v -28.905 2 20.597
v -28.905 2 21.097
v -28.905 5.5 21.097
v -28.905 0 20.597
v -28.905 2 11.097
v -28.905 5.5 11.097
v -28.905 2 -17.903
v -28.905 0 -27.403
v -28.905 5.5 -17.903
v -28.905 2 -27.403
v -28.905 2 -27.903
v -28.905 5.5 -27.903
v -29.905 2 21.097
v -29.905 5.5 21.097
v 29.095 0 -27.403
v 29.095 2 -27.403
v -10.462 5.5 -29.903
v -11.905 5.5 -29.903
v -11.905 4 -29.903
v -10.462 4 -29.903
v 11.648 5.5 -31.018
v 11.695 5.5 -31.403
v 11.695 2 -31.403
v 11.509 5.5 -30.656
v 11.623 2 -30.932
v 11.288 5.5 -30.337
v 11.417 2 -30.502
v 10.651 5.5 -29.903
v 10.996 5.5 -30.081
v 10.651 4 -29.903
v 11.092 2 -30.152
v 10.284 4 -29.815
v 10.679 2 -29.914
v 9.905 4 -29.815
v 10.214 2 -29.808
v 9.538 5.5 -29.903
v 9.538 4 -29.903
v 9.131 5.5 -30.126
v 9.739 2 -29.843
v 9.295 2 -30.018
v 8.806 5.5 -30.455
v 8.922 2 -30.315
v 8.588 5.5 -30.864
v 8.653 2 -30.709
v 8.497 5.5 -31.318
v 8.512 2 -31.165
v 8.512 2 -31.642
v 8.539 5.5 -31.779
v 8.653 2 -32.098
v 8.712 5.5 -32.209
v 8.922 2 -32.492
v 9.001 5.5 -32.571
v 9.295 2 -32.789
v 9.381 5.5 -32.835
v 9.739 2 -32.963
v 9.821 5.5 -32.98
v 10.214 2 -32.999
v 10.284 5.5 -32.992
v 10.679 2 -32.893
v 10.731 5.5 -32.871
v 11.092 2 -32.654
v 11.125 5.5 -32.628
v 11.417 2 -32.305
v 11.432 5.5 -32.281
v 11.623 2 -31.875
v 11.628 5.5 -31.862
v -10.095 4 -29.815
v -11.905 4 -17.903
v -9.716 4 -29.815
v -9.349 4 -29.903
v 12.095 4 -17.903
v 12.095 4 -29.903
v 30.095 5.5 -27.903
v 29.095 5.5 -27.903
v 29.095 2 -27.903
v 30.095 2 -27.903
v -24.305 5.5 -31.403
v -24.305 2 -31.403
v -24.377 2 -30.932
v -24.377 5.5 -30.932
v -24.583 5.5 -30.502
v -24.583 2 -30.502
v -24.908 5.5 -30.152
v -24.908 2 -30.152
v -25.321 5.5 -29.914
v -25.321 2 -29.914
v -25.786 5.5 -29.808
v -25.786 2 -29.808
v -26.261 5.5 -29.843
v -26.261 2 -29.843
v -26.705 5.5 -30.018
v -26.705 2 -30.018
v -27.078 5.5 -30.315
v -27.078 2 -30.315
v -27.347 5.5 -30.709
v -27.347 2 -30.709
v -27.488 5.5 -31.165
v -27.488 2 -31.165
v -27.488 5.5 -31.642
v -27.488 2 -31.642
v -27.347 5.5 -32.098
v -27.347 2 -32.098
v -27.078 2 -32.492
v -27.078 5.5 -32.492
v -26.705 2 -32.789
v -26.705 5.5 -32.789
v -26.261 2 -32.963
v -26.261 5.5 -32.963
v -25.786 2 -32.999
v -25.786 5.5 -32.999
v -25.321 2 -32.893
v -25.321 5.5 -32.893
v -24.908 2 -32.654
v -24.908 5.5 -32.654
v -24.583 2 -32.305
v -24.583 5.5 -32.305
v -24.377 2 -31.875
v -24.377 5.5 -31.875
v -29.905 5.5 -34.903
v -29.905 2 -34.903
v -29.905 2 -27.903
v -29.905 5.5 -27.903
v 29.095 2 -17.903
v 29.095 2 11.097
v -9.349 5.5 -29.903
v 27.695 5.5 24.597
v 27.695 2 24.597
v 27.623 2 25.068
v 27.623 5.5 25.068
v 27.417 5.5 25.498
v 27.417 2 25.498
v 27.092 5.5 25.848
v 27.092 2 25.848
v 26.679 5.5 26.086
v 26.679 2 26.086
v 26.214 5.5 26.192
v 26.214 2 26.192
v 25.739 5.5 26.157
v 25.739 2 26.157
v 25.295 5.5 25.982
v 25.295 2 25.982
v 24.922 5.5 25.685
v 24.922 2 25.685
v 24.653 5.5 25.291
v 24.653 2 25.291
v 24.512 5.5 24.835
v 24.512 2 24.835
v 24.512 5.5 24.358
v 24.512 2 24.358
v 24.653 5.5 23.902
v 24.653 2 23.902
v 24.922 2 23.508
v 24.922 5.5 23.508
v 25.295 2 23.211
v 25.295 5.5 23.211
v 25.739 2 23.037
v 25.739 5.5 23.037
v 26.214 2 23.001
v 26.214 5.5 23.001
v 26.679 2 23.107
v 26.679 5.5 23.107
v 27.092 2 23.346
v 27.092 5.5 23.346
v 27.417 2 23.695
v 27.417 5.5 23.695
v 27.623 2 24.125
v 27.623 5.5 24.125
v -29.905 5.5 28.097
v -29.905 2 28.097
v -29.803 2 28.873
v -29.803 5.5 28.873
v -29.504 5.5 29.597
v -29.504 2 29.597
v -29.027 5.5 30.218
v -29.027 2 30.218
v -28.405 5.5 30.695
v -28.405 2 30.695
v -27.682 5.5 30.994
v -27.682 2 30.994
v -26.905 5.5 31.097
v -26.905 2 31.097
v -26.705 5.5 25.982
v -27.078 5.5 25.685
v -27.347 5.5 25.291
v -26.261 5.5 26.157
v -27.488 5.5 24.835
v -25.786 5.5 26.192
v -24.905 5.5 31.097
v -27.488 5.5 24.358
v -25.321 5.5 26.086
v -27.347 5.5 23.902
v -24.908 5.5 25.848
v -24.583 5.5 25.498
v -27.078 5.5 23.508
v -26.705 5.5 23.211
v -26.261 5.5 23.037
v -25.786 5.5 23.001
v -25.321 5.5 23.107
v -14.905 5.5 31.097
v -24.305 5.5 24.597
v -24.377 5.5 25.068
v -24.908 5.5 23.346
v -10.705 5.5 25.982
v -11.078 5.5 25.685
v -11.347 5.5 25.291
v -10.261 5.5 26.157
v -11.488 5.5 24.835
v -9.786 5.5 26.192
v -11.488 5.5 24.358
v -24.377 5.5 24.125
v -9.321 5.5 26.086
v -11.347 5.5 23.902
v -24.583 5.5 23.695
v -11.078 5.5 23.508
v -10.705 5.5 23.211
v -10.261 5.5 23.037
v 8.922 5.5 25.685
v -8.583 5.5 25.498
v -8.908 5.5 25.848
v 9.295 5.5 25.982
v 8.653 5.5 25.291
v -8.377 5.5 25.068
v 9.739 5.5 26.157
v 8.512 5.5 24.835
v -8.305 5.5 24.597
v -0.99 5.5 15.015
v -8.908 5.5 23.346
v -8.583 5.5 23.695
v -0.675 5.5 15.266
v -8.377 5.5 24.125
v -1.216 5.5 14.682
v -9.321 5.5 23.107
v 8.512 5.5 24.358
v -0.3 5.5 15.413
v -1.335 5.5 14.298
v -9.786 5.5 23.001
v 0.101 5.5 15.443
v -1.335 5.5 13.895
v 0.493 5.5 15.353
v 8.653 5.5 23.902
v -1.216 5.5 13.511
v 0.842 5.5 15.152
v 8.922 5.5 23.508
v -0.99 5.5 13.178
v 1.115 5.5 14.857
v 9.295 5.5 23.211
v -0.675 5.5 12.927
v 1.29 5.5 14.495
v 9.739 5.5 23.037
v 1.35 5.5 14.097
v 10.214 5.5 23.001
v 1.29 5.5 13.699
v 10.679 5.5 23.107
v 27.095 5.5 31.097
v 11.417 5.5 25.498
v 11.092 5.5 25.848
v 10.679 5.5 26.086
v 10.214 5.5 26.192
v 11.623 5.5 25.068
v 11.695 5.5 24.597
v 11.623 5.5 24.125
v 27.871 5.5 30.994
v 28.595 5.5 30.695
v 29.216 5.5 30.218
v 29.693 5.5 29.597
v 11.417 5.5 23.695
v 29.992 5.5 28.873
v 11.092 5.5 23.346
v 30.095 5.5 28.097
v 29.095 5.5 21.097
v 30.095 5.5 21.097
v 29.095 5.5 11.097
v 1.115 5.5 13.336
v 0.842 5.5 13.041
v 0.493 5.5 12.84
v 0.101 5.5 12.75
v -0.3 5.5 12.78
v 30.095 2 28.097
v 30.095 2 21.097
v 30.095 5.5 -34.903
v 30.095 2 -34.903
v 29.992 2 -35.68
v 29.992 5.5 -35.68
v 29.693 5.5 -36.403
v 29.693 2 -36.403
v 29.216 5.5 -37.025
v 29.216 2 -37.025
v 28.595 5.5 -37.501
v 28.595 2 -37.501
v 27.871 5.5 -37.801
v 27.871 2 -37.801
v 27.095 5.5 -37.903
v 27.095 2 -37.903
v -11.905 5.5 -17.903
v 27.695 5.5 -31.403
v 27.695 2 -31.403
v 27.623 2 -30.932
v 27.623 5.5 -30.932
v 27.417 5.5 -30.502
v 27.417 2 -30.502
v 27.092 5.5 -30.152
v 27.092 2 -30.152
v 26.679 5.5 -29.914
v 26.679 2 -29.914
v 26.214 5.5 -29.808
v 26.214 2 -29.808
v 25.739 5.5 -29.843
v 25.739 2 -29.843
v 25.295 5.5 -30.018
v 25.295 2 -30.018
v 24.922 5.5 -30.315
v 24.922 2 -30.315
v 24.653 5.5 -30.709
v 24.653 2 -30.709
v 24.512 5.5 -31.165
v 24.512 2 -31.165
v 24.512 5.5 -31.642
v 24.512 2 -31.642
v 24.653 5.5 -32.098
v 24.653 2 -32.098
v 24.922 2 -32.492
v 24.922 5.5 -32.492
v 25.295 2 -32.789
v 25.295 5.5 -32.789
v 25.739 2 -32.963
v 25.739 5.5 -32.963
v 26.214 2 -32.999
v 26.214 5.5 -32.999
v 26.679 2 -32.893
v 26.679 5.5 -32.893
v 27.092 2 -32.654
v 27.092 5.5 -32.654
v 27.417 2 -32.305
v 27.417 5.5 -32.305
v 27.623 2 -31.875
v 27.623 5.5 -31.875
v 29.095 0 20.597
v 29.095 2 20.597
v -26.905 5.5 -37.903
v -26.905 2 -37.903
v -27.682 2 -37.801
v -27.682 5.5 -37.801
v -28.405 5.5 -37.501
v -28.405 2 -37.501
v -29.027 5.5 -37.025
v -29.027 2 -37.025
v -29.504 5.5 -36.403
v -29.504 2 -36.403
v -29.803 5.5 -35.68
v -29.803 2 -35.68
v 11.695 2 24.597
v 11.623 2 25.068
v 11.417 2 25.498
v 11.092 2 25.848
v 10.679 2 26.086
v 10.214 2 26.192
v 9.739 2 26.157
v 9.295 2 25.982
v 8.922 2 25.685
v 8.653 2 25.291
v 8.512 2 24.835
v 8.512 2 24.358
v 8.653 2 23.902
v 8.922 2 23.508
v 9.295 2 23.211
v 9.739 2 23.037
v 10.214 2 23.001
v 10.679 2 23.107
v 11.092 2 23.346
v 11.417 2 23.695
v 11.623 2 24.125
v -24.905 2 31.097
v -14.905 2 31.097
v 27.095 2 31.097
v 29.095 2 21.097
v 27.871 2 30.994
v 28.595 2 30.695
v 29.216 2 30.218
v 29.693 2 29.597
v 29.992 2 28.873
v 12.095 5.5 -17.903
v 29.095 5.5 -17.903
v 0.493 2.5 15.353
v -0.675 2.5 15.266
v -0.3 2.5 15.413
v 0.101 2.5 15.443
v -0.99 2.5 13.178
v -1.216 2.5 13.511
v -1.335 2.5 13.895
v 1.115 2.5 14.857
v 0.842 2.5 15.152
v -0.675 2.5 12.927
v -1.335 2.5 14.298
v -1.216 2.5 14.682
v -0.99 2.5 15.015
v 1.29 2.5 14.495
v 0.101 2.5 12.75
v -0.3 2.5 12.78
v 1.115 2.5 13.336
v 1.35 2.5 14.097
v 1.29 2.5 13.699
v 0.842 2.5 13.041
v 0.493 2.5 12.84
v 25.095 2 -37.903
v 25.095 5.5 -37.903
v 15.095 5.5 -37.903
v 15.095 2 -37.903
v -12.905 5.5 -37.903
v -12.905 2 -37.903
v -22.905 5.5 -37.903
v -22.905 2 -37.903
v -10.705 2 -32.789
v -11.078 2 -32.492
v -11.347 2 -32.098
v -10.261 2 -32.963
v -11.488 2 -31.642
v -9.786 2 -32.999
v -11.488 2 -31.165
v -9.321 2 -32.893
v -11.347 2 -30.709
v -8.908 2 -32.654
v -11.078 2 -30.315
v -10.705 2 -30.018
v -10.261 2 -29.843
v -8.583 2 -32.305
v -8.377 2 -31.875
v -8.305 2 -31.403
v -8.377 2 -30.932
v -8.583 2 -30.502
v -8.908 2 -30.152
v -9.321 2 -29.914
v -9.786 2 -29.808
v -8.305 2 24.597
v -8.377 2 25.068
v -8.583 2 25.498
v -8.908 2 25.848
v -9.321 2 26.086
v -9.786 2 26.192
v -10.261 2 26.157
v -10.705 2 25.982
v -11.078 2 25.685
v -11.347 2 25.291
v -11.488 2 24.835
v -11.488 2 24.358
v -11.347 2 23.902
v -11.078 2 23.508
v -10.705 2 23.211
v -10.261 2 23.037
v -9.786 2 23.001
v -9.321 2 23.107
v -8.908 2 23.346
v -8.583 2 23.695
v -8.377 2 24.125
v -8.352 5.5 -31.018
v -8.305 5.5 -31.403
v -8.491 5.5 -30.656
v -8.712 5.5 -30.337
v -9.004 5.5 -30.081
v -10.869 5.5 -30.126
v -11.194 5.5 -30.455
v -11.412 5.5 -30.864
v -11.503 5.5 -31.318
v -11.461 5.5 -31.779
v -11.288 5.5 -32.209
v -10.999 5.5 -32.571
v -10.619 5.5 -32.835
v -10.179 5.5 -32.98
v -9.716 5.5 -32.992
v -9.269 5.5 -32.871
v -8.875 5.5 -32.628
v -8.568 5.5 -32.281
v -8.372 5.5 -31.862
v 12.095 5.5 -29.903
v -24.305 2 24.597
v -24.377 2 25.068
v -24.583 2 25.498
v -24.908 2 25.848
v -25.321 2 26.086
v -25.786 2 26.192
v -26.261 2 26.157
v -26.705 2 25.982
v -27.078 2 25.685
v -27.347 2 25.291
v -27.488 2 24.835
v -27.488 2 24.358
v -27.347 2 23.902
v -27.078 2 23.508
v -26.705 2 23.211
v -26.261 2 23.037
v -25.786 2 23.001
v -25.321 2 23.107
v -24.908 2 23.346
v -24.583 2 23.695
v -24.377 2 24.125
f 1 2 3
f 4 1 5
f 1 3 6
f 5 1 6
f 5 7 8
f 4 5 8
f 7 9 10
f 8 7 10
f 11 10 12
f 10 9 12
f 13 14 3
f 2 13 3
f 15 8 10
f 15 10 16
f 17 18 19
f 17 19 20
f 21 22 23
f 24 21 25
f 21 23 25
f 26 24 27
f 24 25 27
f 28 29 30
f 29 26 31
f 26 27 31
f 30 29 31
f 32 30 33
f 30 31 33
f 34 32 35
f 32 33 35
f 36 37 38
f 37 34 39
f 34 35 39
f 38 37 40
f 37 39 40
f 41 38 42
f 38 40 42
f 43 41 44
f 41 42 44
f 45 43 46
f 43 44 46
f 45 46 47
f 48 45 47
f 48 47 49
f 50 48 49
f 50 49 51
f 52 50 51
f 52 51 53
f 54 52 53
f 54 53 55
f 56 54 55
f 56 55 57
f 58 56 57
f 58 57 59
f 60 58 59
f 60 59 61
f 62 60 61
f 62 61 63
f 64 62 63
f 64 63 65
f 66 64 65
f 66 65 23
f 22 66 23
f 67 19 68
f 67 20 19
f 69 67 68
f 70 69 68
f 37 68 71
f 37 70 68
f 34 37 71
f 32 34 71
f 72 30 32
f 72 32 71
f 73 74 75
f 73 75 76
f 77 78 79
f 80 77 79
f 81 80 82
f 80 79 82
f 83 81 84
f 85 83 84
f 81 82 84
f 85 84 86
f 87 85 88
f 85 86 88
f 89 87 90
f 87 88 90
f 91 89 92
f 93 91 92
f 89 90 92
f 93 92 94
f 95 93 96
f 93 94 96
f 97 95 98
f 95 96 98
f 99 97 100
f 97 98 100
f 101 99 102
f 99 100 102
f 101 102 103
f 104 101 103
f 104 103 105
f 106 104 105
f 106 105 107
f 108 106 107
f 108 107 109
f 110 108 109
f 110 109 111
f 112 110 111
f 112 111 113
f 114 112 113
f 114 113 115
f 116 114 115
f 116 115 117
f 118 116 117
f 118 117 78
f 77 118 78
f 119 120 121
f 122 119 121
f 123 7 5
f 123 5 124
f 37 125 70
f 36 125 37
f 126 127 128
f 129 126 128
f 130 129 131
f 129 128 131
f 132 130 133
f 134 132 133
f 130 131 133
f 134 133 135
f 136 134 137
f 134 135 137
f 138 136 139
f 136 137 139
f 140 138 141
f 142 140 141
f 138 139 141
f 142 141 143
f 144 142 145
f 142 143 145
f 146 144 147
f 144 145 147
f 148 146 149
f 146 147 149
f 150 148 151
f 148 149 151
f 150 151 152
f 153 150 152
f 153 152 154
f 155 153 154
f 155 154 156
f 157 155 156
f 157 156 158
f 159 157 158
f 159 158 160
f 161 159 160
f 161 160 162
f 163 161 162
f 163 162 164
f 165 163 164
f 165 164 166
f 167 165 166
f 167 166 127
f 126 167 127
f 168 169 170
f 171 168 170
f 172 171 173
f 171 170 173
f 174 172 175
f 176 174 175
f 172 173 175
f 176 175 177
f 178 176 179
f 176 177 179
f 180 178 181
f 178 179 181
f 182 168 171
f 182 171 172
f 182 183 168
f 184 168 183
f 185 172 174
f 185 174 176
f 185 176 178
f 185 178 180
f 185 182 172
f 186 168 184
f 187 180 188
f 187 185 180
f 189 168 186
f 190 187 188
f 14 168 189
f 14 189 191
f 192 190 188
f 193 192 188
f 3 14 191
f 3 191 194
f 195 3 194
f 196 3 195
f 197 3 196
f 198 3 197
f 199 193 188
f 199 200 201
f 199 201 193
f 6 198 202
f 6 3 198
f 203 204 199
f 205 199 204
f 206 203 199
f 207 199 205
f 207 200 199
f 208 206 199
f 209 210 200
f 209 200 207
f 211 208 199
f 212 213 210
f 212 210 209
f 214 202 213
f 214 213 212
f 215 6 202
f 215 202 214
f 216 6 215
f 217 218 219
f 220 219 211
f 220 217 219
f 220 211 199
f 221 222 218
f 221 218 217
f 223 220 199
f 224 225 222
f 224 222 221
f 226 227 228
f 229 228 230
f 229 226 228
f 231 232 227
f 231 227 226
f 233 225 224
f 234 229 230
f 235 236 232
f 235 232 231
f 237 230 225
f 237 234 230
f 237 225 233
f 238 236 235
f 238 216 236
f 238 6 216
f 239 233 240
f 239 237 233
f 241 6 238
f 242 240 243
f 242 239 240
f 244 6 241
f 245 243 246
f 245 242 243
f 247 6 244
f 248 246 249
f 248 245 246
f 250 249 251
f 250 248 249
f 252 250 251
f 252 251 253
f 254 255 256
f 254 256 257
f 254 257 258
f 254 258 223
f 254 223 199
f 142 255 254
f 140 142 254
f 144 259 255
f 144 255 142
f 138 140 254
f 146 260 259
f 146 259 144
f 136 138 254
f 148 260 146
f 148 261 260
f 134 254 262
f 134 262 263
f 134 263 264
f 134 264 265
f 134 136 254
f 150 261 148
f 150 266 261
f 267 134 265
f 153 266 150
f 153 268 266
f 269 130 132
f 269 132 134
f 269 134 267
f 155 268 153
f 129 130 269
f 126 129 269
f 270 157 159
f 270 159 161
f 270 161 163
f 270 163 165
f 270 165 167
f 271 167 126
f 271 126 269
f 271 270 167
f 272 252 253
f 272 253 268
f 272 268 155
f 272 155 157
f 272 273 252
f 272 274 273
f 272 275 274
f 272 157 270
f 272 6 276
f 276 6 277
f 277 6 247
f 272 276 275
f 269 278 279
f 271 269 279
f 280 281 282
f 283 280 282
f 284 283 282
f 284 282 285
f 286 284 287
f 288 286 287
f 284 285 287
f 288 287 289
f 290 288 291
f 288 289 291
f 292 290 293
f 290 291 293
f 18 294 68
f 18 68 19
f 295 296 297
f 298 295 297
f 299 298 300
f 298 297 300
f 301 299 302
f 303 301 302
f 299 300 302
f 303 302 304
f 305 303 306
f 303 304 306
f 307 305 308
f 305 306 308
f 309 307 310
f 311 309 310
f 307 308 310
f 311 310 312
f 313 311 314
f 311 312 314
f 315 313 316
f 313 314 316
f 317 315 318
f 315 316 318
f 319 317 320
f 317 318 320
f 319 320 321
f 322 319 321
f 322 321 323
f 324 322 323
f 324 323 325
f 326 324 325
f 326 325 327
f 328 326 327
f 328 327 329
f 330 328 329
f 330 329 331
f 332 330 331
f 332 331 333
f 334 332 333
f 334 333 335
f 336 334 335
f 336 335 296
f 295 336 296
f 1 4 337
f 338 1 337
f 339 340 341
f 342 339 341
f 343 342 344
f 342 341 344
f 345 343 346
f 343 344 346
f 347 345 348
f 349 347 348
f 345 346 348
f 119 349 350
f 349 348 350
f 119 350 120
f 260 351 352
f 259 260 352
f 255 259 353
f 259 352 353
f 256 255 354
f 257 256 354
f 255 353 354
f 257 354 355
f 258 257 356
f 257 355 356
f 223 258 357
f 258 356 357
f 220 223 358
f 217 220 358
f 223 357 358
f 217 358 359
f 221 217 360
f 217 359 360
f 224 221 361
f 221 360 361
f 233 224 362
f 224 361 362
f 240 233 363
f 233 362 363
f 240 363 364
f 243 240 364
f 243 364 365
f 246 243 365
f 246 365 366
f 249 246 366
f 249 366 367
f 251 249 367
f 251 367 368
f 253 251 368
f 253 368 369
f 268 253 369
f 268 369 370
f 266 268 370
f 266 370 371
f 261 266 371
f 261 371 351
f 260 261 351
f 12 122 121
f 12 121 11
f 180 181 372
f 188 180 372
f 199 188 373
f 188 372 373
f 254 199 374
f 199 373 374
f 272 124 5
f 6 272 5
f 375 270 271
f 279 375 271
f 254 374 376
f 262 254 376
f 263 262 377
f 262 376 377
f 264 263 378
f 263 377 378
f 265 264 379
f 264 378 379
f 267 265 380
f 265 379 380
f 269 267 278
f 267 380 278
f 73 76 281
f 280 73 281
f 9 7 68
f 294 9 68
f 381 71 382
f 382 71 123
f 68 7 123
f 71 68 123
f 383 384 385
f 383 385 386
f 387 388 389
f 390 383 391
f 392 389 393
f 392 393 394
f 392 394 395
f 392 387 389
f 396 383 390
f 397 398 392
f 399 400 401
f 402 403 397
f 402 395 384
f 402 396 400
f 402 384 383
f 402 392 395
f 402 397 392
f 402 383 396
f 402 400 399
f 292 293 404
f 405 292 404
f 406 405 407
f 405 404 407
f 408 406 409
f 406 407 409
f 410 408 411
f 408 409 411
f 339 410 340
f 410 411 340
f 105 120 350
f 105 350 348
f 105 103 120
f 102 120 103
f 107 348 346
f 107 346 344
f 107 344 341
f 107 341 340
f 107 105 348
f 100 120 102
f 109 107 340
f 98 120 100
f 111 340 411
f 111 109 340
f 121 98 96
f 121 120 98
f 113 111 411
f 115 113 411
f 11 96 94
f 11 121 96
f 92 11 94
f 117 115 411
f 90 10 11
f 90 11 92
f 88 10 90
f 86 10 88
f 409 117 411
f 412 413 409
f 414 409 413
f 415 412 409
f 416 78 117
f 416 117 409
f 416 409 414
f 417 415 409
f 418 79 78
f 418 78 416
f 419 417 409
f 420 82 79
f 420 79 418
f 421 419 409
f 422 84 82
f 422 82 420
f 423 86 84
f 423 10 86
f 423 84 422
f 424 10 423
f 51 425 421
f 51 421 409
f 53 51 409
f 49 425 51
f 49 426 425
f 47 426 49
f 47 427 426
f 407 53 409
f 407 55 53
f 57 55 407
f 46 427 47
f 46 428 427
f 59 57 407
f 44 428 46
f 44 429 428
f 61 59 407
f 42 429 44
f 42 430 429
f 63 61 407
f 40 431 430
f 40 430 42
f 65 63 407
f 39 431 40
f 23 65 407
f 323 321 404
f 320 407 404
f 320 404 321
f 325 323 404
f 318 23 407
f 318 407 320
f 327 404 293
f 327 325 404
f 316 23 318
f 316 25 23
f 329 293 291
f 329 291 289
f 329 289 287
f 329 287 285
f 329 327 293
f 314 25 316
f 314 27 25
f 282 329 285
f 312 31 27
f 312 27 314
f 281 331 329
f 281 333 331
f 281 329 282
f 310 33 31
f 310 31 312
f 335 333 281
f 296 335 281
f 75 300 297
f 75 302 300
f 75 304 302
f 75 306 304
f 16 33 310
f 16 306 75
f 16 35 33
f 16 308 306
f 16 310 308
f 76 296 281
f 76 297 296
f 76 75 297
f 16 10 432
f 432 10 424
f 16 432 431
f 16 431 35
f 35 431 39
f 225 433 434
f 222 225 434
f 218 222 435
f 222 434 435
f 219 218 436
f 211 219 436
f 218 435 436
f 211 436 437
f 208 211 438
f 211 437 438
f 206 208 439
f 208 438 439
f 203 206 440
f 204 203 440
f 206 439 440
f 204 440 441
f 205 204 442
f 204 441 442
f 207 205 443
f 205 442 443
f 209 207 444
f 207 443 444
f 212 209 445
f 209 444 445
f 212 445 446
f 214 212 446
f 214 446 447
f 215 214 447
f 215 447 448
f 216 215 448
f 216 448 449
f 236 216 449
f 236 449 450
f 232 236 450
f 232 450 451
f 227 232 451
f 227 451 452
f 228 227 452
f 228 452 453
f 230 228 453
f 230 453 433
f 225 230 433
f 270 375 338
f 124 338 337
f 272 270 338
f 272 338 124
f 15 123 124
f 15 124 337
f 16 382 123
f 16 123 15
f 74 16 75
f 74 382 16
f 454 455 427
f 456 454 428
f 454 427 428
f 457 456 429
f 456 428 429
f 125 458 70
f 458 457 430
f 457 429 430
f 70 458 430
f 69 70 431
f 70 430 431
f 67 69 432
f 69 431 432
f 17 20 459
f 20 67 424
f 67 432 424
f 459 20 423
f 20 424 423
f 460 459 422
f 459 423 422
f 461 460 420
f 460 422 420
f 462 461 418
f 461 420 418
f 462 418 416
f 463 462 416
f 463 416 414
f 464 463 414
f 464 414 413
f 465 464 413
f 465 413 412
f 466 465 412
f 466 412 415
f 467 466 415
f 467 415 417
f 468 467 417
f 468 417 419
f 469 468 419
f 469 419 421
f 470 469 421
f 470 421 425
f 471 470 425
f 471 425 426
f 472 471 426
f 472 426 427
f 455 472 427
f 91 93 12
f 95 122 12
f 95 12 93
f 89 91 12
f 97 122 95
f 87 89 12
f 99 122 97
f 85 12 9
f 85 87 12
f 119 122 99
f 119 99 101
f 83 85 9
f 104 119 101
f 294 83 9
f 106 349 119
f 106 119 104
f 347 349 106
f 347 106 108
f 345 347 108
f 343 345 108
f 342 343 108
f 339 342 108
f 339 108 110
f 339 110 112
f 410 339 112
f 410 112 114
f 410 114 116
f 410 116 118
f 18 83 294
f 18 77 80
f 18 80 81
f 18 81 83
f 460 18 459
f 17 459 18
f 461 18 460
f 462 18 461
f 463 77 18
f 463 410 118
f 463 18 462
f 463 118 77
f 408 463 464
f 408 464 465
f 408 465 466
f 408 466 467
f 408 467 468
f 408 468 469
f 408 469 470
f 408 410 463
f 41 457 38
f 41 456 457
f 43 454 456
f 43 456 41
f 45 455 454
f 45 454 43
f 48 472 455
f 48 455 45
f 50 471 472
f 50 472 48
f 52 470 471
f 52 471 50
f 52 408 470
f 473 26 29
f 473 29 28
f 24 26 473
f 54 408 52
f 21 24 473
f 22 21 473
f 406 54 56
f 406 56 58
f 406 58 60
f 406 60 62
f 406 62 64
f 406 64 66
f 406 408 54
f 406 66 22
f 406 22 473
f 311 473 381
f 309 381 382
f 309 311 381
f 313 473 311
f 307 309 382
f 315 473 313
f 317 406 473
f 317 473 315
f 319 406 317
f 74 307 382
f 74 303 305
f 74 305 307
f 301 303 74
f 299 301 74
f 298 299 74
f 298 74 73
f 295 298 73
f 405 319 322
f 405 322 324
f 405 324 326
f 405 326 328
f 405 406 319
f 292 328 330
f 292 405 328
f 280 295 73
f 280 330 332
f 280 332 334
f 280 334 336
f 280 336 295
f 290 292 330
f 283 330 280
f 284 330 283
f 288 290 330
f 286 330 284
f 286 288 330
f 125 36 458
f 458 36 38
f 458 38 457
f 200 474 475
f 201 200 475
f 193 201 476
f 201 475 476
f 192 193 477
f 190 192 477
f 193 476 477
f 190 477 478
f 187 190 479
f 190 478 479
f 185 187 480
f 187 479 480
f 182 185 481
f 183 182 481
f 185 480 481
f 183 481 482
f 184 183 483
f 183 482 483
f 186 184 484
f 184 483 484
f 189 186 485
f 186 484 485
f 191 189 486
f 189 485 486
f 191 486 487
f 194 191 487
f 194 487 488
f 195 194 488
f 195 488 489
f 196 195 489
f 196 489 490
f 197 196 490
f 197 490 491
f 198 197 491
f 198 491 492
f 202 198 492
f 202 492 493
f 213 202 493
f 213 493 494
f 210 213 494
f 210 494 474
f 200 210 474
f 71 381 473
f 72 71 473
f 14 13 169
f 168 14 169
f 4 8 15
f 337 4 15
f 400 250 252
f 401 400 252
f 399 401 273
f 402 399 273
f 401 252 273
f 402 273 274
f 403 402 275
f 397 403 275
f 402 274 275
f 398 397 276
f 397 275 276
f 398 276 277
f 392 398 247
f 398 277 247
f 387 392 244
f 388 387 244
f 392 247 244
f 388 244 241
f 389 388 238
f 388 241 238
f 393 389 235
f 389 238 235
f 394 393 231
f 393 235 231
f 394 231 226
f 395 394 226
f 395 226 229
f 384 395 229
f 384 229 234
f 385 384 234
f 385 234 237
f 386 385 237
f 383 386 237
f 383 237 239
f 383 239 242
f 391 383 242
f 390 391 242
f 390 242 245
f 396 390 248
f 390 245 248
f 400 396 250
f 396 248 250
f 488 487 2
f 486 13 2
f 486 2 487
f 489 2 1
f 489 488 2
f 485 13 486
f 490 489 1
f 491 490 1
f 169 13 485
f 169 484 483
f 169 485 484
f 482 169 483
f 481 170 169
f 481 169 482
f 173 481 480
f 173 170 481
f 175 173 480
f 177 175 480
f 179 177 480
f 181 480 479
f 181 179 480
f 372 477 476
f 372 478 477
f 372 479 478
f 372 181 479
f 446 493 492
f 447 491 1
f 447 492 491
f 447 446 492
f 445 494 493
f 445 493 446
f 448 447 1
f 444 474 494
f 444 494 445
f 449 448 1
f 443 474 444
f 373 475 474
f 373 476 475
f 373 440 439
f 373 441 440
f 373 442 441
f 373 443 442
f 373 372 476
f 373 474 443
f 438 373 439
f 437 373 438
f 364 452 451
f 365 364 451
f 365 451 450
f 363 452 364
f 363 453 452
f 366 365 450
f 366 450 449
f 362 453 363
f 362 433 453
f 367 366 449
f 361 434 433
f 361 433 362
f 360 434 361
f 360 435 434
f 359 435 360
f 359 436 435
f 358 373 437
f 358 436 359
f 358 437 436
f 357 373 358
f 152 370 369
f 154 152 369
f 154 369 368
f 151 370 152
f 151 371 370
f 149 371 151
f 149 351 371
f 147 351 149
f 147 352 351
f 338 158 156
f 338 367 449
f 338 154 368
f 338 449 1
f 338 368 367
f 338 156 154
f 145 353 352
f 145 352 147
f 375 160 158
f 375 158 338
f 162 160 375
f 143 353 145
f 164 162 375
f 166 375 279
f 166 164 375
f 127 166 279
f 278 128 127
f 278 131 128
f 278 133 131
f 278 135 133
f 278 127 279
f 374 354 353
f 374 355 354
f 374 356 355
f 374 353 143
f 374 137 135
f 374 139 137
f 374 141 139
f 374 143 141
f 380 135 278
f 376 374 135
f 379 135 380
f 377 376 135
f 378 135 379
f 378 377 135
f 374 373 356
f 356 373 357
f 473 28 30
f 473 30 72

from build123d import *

# Parameters (mm, degrees)
SKETCH1_W           = 60
SKETCH1_H           = 48
BOSS_EXTRUDE1_DEPTH = 2
BOSS_EXTRUDE2_DEPTH = 3.5
SKETCH3_W           = 6.52386431
SKETCH3_H           = 49
SKETCH3_W_2         = 6.523864309
CUT_EXTRUDE2_DEPTH  = 15
SKETCH4_W           = 24
SKETCH4_H           = 12
CUT_EXTRUDE3_DEPTH  = 1.5
SKETCH5_R           = 1.35
CUT_EXTRUDE4_DEPTH  = 3
SKETCH6_R           = 1.35
CUT_EXTRUDE5_DEPTH  = 3
SKETCH7_W           = 69.929961246
SKETCH7_H           = 12.314710156
SKETCH7_W_2         = 77.406749556
SKETCH7_H_2         = 16.199708004
CUT_EXTRUDE6_DEPTH  = 2
SKETCH8_R           = 1.6
CUT_EXTRUDE7_DEPTH  = 18
SKETCH9_W           = 6.597166155
SKETCH9_H           = 6.303958771
SKETCH9_W_2         = 5.93744954
SKETCH9_H_2         = 5.497638462
SKETCH9_W_3         = 7.769995694
SKETCH9_W_4         = 5.131129232
SKETCH9_H_3         = 5.204431078
SKETCH9_W_5         = 5.497638463
SKETCH9_H_4         = 5.0930957
SKETCH9_W_6         = 4.691318155
BOSS_EXTRUDE3_DEPTH = 3.5
SKETCH10_W          = 13.673673514
SKETCH10_H          = 2.686711401
SKETCH10_W_2        = 10.911645047
SKETCH10_H_2        = 3.141048784
SKETCH10_W_3        = 10.921694408
SKETCH10_H_3        = 3.054325349
SKETCH10_W_4        = 12
BOSS_EXTRUDE4_DEPTH = 3.5


with BuildPart() as part:
    # Sketch1 → Boss-Extrude1 (new body)
    with BuildSketch(Plane(origin=(0, 0, 0), x_dir=(1, 0, 0), z_dir=(0, 1, 0))):
        with Locations((0.094538135, 3.403372847)):
            Rectangle(SKETCH1_W, SKETCH1_H)
        with BuildLine():
            Line((-29.905461865, -20.596627153), (-29.905461865, -28.096627153))
            ThreePointArc((-29.905461865, -28.096627153), (-29.026782209, -30.217947496), (-26.905461865, -31.096627153))
            Line((-26.905461865, -31.096627153), (-24.905461865, -31.096627153))
            Line((-24.905461865, -31.096627153), (-24.905461865, -29.096627153))
            Line((-24.905461865, -29.096627153), (-14.905461865, -29.096627153))
            Line((-14.905461865, -29.096627153), (-14.905461865, -31.096627153))
            Line((-14.905461865, -31.096627153), (13.094538135, -31.096627153))
            Line((13.094538135, -31.096627153), (13.094538135, -29.096627153))
            Line((13.094538135, -29.096627153), (23.094538135, -29.096627153))
            Line((23.094538135, -29.096627153), (23.094538135, -31.096627153))
            Line((23.094538135, -31.096627153), (27.094538135, -31.096627153))
            ThreePointArc((27.094538135, -31.096627153), (29.215858478, -30.217947496), (30.094538135, -28.096627153))
            Line((30.094538135, -28.096627153), (30.094538135, -20.596627153))
            Line((30.094538135, -20.596627153), (-29.905461865, -20.596627153))
        make_face()
        with BuildLine():
            Line((30.094538135, 27.403372847), (30.094538135, 34.903372847))
            ThreePointArc((30.094538135, 34.903372847), (29.215858478, 37.024693191), (27.094538135, 37.903372847))
            Line((27.094538135, 37.903372847), (25.094538135, 37.903372847))
            Line((25.094538135, 37.903372847), (25.094538135, 35.903372847))
            Line((25.094538135, 35.903372847), (15.094538135, 35.903372847))
            Line((15.094538135, 35.903372847), (15.094538135, 37.903372847))
            Line((15.094538135, 37.903372847), (-12.905461865, 37.903372847))
            Line((-12.905461865, 37.903372847), (-12.905461865, 35.903372847))
            Line((-12.905461865, 35.903372847), (-22.905461865, 35.903372847))
            Line((-22.905461865, 35.903372847), (-22.905461865, 37.903372847))
            Line((-22.905461865, 37.903372847), (-26.905461865, 37.903372847))
            ThreePointArc((-26.905461865, 37.903372847), (-29.026782209, 37.024693191), (-29.905461865, 34.903372847))
            Line((-29.905461865, 34.903372847), (-29.905461865, 27.403372847))
            Line((-29.905461865, 27.403372847), (30.094538135, 27.403372847))
        make_face()
    extrude(amount=BOSS_EXTRUDE1_DEPTH)

    # Sketch2 → Boss-Extrude2 (add)
    with BuildSketch(Plane(origin=(0, 2, 0), x_dir=(1, 0, 0), z_dir=(0, 1, 0))):
        with BuildLine():
            Line((30.094538135, -11.096627153), (-29.905461865, -11.096627153))
            Line((-29.905461865, -11.096627153), (-29.905461865, -28.096627153))
            ThreePointArc((-29.905461865, -28.096627153), (-29.026782209, -30.217947496), (-26.905461865, -31.096627153))
            Line((-26.905461865, -31.096627153), (-24.905461865, -31.096627153))
            Line((-24.905461865, -31.096627153), (-24.905461865, -29.096627153))
            Line((-24.905461865, -29.096627153), (-14.905461865, -29.096627153))
            Line((-14.905461865, -29.096627153), (-14.905461865, -31.096627153))
            Line((-14.905461865, -31.096627153), (13.094538135, -31.096627153))
            Line((13.094538135, -31.096627153), (13.094538135, -29.096627153))
            Line((13.094538135, -29.096627153), (23.094538135, -29.096627153))
            Line((23.094538135, -29.096627153), (23.094538135, -31.096627153))
            Line((23.094538135, -31.096627153), (27.094538135, -31.096627153))
            ThreePointArc((27.094538135, -31.096627153), (29.215858478, -30.217947496), (30.094538135, -28.096627153))
            Line((30.094538135, -28.096627153), (30.094538135, -11.096627153))
        make_face()
        with BuildLine():
            Line((-29.905461865, 34.903372847), (-29.905461865, 17.903372847))
            Line((-29.905461865, 17.903372847), (30.094538135, 17.903372847))
            Line((30.094538135, 17.903372847), (30.094538135, 34.903372847))
            ThreePointArc((30.094538135, 34.903372847), (29.215858478, 37.024693191), (27.094538135, 37.903372847))
            Line((27.094538135, 37.903372847), (25.094538135, 37.903372847))
            Line((25.094538135, 37.903372847), (25.094538135, 35.903372847))
            Line((25.094538135, 35.903372847), (15.094538135, 35.903372847))
            Line((15.094538135, 35.903372847), (15.094538135, 37.903372847))
            Line((15.094538135, 37.903372847), (-12.905461865, 37.903372847))
            Line((-12.905461865, 37.903372847), (-12.905461865, 35.903372847))
            Line((-12.905461865, 35.903372847), (-22.905461865, 35.903372847))
            Line((-22.905461865, 35.903372847), (-22.905461865, 37.903372847))
            Line((-22.905461865, 37.903372847), (-26.905461865, 37.903372847))
            ThreePointArc((-26.905461865, 37.903372847), (-29.026782209, 37.024693191), (-29.905461865, 34.903372847))
        make_face()
    extrude(amount=BOSS_EXTRUDE2_DEPTH)

    # Sketch3 → Cut-Extrude2 (cut)
    with BuildSketch(Plane(origin=(0, 5.5, 0), x_dir=(1, 0, 0), z_dir=(0, 1, 0))):
        with Locations((-32.16739402, 3.403372847)):
            Rectangle(SKETCH3_W, SKETCH3_H)
        with Locations((32.35647029, 3.403372847)):
            Rectangle(SKETCH3_W_2, SKETCH3_H)
    extrude(amount=-CUT_EXTRUDE2_DEPTH, mode=Mode.SUBTRACT)

    # Sketch4 → Cut-Extrude3 (cut)
    with BuildSketch(Plane(origin=(0, 5.5, 0), x_dir=(1, 0, 0), z_dir=(0, 1, 0))):
        with Locations((0.094538135, 23.903372847)):
            Rectangle(SKETCH4_W, SKETCH4_H)
    extrude(amount=-CUT_EXTRUDE3_DEPTH, mode=Mode.SUBTRACT)

    # Sketch5 → Cut-Extrude4 (cut)
    with BuildSketch(Plane(origin=(0, 5.5, 0), x_dir=(1, 0, 0), z_dir=(0, 1, 0))):
        with Locations((0, -14.096627153)):
            Circle(SKETCH5_R)
    extrude(amount=-CUT_EXTRUDE4_DEPTH, mode=Mode.SUBTRACT)

    # Sketch6 → Cut-Extrude5 (cut)
    with BuildSketch(Plane(origin=(0, 5.5, 0), x_dir=(1, 0, 0), z_dir=(0, 1, 0))):
        with Locations((20.770286942, 25.903372847)):
            Circle(SKETCH6_R)
        with Locations((0, 31.903372847)):
            Circle(SKETCH6_R)
        with Locations((-20.187989902, 25.903372847)):
            Circle(SKETCH6_R)
        with Locations((-20.187989902, -19.096627153)):
            Circle(SKETCH6_R)
        with Locations((0, -25.096627153)):
            Circle(SKETCH6_R)
        with Locations((20.770286942, -19.096627153)):
            Circle(SKETCH6_R)
    extrude(amount=-CUT_EXTRUDE5_DEPTH, mode=Mode.SUBTRACT)

    # Sketch7 → Cut-Extrude6 (cut)
    with BuildSketch(Plane.XZ):
        with Locations((1.157414904, 26.753982231)):
            Rectangle(SKETCH7_W, SKETCH7_H)
        with Locations((2.037037058, -35.503226849)):
            Rectangle(SKETCH7_W_2, SKETCH7_H_2)
    extrude(amount=-CUT_EXTRUDE6_DEPTH, mode=Mode.SUBTRACT)

    # Sketch8 → Cut-Extrude7 (cut)
    with BuildSketch(Plane.XZ.offset(-2)):
        with Locations((-25.905461865, -31.403372847)):
            Circle(SKETCH8_R)
        with Locations((-9.905461865, -31.403372847)):
            Circle(SKETCH8_R)
        with Locations((10.094538135, -31.403372847)):
            Circle(SKETCH8_R)
        with Locations((26.094538135, -31.403372847)):
            Circle(SKETCH8_R)
        with Locations((26.094538135, 24.596627153)):
            Circle(SKETCH8_R)
        with Locations((10.094538135, 24.596627153)):
            Circle(SKETCH8_R)
        with Locations((-9.905461865, 24.596627153)):
            Circle(SKETCH8_R)
        with Locations((-25.905461865, 24.596627153)):
            Circle(SKETCH8_R)
    extrude(amount=-CUT_EXTRUDE7_DEPTH, mode=Mode.SUBTRACT)

    # Sketch9 → Boss-Extrude3 (add)
    with BuildSketch(Plane(origin=(0, 5.5, 0), x_dir=(1, 0, 0), z_dir=(0, 1, 0))):
        with Locations((-0.455225712, -25.037743467)):
            Rectangle(SKETCH9_W, SKETCH9_H)
        with Locations((20.399149524, -19.13694485)):
            Rectangle(SKETCH9_W_2, SKETCH9_H_2)
        with Locations((-21.272950024, -19.13694485)):
            Rectangle(SKETCH9_W_3, SKETCH9_H_2)
        with Locations((-20.759837101, 26.236897929)):
            Rectangle(SKETCH9_W_4, SKETCH9_H_3)
        with Locations((0.094538135, 32.449920697)):
            Rectangle(SKETCH9_W_5, SKETCH9_H_4)
        with Locations((20.362498601, 26.236897929)):
            Rectangle(SKETCH9_W_6, SKETCH9_H_3)
    extrude(amount=-BOSS_EXTRUDE3_DEPTH)

    # Sketch10 → Boss-Extrude4 (add)
    with BuildSketch(Plane.XZ.offset(-2)):
        with Locations((-18.068625108, 29.753271453)):
            Rectangle(SKETCH10_W, SKETCH10_H)
        with Locations((18.550360659, 29.526102761)):
            Rectangle(SKETCH10_W_2, SKETCH10_H_2)
        with Locations((-18.366309069, -36.376210173)):
            Rectangle(SKETCH10_W_3, SKETCH10_H_3)
        with Locations((19.094538135, -36.376210173)):
            Rectangle(SKETCH10_W_4, SKETCH10_H_3)
    extrude(amount=-BOSS_EXTRUDE4_DEPTH)


solid = part.part
